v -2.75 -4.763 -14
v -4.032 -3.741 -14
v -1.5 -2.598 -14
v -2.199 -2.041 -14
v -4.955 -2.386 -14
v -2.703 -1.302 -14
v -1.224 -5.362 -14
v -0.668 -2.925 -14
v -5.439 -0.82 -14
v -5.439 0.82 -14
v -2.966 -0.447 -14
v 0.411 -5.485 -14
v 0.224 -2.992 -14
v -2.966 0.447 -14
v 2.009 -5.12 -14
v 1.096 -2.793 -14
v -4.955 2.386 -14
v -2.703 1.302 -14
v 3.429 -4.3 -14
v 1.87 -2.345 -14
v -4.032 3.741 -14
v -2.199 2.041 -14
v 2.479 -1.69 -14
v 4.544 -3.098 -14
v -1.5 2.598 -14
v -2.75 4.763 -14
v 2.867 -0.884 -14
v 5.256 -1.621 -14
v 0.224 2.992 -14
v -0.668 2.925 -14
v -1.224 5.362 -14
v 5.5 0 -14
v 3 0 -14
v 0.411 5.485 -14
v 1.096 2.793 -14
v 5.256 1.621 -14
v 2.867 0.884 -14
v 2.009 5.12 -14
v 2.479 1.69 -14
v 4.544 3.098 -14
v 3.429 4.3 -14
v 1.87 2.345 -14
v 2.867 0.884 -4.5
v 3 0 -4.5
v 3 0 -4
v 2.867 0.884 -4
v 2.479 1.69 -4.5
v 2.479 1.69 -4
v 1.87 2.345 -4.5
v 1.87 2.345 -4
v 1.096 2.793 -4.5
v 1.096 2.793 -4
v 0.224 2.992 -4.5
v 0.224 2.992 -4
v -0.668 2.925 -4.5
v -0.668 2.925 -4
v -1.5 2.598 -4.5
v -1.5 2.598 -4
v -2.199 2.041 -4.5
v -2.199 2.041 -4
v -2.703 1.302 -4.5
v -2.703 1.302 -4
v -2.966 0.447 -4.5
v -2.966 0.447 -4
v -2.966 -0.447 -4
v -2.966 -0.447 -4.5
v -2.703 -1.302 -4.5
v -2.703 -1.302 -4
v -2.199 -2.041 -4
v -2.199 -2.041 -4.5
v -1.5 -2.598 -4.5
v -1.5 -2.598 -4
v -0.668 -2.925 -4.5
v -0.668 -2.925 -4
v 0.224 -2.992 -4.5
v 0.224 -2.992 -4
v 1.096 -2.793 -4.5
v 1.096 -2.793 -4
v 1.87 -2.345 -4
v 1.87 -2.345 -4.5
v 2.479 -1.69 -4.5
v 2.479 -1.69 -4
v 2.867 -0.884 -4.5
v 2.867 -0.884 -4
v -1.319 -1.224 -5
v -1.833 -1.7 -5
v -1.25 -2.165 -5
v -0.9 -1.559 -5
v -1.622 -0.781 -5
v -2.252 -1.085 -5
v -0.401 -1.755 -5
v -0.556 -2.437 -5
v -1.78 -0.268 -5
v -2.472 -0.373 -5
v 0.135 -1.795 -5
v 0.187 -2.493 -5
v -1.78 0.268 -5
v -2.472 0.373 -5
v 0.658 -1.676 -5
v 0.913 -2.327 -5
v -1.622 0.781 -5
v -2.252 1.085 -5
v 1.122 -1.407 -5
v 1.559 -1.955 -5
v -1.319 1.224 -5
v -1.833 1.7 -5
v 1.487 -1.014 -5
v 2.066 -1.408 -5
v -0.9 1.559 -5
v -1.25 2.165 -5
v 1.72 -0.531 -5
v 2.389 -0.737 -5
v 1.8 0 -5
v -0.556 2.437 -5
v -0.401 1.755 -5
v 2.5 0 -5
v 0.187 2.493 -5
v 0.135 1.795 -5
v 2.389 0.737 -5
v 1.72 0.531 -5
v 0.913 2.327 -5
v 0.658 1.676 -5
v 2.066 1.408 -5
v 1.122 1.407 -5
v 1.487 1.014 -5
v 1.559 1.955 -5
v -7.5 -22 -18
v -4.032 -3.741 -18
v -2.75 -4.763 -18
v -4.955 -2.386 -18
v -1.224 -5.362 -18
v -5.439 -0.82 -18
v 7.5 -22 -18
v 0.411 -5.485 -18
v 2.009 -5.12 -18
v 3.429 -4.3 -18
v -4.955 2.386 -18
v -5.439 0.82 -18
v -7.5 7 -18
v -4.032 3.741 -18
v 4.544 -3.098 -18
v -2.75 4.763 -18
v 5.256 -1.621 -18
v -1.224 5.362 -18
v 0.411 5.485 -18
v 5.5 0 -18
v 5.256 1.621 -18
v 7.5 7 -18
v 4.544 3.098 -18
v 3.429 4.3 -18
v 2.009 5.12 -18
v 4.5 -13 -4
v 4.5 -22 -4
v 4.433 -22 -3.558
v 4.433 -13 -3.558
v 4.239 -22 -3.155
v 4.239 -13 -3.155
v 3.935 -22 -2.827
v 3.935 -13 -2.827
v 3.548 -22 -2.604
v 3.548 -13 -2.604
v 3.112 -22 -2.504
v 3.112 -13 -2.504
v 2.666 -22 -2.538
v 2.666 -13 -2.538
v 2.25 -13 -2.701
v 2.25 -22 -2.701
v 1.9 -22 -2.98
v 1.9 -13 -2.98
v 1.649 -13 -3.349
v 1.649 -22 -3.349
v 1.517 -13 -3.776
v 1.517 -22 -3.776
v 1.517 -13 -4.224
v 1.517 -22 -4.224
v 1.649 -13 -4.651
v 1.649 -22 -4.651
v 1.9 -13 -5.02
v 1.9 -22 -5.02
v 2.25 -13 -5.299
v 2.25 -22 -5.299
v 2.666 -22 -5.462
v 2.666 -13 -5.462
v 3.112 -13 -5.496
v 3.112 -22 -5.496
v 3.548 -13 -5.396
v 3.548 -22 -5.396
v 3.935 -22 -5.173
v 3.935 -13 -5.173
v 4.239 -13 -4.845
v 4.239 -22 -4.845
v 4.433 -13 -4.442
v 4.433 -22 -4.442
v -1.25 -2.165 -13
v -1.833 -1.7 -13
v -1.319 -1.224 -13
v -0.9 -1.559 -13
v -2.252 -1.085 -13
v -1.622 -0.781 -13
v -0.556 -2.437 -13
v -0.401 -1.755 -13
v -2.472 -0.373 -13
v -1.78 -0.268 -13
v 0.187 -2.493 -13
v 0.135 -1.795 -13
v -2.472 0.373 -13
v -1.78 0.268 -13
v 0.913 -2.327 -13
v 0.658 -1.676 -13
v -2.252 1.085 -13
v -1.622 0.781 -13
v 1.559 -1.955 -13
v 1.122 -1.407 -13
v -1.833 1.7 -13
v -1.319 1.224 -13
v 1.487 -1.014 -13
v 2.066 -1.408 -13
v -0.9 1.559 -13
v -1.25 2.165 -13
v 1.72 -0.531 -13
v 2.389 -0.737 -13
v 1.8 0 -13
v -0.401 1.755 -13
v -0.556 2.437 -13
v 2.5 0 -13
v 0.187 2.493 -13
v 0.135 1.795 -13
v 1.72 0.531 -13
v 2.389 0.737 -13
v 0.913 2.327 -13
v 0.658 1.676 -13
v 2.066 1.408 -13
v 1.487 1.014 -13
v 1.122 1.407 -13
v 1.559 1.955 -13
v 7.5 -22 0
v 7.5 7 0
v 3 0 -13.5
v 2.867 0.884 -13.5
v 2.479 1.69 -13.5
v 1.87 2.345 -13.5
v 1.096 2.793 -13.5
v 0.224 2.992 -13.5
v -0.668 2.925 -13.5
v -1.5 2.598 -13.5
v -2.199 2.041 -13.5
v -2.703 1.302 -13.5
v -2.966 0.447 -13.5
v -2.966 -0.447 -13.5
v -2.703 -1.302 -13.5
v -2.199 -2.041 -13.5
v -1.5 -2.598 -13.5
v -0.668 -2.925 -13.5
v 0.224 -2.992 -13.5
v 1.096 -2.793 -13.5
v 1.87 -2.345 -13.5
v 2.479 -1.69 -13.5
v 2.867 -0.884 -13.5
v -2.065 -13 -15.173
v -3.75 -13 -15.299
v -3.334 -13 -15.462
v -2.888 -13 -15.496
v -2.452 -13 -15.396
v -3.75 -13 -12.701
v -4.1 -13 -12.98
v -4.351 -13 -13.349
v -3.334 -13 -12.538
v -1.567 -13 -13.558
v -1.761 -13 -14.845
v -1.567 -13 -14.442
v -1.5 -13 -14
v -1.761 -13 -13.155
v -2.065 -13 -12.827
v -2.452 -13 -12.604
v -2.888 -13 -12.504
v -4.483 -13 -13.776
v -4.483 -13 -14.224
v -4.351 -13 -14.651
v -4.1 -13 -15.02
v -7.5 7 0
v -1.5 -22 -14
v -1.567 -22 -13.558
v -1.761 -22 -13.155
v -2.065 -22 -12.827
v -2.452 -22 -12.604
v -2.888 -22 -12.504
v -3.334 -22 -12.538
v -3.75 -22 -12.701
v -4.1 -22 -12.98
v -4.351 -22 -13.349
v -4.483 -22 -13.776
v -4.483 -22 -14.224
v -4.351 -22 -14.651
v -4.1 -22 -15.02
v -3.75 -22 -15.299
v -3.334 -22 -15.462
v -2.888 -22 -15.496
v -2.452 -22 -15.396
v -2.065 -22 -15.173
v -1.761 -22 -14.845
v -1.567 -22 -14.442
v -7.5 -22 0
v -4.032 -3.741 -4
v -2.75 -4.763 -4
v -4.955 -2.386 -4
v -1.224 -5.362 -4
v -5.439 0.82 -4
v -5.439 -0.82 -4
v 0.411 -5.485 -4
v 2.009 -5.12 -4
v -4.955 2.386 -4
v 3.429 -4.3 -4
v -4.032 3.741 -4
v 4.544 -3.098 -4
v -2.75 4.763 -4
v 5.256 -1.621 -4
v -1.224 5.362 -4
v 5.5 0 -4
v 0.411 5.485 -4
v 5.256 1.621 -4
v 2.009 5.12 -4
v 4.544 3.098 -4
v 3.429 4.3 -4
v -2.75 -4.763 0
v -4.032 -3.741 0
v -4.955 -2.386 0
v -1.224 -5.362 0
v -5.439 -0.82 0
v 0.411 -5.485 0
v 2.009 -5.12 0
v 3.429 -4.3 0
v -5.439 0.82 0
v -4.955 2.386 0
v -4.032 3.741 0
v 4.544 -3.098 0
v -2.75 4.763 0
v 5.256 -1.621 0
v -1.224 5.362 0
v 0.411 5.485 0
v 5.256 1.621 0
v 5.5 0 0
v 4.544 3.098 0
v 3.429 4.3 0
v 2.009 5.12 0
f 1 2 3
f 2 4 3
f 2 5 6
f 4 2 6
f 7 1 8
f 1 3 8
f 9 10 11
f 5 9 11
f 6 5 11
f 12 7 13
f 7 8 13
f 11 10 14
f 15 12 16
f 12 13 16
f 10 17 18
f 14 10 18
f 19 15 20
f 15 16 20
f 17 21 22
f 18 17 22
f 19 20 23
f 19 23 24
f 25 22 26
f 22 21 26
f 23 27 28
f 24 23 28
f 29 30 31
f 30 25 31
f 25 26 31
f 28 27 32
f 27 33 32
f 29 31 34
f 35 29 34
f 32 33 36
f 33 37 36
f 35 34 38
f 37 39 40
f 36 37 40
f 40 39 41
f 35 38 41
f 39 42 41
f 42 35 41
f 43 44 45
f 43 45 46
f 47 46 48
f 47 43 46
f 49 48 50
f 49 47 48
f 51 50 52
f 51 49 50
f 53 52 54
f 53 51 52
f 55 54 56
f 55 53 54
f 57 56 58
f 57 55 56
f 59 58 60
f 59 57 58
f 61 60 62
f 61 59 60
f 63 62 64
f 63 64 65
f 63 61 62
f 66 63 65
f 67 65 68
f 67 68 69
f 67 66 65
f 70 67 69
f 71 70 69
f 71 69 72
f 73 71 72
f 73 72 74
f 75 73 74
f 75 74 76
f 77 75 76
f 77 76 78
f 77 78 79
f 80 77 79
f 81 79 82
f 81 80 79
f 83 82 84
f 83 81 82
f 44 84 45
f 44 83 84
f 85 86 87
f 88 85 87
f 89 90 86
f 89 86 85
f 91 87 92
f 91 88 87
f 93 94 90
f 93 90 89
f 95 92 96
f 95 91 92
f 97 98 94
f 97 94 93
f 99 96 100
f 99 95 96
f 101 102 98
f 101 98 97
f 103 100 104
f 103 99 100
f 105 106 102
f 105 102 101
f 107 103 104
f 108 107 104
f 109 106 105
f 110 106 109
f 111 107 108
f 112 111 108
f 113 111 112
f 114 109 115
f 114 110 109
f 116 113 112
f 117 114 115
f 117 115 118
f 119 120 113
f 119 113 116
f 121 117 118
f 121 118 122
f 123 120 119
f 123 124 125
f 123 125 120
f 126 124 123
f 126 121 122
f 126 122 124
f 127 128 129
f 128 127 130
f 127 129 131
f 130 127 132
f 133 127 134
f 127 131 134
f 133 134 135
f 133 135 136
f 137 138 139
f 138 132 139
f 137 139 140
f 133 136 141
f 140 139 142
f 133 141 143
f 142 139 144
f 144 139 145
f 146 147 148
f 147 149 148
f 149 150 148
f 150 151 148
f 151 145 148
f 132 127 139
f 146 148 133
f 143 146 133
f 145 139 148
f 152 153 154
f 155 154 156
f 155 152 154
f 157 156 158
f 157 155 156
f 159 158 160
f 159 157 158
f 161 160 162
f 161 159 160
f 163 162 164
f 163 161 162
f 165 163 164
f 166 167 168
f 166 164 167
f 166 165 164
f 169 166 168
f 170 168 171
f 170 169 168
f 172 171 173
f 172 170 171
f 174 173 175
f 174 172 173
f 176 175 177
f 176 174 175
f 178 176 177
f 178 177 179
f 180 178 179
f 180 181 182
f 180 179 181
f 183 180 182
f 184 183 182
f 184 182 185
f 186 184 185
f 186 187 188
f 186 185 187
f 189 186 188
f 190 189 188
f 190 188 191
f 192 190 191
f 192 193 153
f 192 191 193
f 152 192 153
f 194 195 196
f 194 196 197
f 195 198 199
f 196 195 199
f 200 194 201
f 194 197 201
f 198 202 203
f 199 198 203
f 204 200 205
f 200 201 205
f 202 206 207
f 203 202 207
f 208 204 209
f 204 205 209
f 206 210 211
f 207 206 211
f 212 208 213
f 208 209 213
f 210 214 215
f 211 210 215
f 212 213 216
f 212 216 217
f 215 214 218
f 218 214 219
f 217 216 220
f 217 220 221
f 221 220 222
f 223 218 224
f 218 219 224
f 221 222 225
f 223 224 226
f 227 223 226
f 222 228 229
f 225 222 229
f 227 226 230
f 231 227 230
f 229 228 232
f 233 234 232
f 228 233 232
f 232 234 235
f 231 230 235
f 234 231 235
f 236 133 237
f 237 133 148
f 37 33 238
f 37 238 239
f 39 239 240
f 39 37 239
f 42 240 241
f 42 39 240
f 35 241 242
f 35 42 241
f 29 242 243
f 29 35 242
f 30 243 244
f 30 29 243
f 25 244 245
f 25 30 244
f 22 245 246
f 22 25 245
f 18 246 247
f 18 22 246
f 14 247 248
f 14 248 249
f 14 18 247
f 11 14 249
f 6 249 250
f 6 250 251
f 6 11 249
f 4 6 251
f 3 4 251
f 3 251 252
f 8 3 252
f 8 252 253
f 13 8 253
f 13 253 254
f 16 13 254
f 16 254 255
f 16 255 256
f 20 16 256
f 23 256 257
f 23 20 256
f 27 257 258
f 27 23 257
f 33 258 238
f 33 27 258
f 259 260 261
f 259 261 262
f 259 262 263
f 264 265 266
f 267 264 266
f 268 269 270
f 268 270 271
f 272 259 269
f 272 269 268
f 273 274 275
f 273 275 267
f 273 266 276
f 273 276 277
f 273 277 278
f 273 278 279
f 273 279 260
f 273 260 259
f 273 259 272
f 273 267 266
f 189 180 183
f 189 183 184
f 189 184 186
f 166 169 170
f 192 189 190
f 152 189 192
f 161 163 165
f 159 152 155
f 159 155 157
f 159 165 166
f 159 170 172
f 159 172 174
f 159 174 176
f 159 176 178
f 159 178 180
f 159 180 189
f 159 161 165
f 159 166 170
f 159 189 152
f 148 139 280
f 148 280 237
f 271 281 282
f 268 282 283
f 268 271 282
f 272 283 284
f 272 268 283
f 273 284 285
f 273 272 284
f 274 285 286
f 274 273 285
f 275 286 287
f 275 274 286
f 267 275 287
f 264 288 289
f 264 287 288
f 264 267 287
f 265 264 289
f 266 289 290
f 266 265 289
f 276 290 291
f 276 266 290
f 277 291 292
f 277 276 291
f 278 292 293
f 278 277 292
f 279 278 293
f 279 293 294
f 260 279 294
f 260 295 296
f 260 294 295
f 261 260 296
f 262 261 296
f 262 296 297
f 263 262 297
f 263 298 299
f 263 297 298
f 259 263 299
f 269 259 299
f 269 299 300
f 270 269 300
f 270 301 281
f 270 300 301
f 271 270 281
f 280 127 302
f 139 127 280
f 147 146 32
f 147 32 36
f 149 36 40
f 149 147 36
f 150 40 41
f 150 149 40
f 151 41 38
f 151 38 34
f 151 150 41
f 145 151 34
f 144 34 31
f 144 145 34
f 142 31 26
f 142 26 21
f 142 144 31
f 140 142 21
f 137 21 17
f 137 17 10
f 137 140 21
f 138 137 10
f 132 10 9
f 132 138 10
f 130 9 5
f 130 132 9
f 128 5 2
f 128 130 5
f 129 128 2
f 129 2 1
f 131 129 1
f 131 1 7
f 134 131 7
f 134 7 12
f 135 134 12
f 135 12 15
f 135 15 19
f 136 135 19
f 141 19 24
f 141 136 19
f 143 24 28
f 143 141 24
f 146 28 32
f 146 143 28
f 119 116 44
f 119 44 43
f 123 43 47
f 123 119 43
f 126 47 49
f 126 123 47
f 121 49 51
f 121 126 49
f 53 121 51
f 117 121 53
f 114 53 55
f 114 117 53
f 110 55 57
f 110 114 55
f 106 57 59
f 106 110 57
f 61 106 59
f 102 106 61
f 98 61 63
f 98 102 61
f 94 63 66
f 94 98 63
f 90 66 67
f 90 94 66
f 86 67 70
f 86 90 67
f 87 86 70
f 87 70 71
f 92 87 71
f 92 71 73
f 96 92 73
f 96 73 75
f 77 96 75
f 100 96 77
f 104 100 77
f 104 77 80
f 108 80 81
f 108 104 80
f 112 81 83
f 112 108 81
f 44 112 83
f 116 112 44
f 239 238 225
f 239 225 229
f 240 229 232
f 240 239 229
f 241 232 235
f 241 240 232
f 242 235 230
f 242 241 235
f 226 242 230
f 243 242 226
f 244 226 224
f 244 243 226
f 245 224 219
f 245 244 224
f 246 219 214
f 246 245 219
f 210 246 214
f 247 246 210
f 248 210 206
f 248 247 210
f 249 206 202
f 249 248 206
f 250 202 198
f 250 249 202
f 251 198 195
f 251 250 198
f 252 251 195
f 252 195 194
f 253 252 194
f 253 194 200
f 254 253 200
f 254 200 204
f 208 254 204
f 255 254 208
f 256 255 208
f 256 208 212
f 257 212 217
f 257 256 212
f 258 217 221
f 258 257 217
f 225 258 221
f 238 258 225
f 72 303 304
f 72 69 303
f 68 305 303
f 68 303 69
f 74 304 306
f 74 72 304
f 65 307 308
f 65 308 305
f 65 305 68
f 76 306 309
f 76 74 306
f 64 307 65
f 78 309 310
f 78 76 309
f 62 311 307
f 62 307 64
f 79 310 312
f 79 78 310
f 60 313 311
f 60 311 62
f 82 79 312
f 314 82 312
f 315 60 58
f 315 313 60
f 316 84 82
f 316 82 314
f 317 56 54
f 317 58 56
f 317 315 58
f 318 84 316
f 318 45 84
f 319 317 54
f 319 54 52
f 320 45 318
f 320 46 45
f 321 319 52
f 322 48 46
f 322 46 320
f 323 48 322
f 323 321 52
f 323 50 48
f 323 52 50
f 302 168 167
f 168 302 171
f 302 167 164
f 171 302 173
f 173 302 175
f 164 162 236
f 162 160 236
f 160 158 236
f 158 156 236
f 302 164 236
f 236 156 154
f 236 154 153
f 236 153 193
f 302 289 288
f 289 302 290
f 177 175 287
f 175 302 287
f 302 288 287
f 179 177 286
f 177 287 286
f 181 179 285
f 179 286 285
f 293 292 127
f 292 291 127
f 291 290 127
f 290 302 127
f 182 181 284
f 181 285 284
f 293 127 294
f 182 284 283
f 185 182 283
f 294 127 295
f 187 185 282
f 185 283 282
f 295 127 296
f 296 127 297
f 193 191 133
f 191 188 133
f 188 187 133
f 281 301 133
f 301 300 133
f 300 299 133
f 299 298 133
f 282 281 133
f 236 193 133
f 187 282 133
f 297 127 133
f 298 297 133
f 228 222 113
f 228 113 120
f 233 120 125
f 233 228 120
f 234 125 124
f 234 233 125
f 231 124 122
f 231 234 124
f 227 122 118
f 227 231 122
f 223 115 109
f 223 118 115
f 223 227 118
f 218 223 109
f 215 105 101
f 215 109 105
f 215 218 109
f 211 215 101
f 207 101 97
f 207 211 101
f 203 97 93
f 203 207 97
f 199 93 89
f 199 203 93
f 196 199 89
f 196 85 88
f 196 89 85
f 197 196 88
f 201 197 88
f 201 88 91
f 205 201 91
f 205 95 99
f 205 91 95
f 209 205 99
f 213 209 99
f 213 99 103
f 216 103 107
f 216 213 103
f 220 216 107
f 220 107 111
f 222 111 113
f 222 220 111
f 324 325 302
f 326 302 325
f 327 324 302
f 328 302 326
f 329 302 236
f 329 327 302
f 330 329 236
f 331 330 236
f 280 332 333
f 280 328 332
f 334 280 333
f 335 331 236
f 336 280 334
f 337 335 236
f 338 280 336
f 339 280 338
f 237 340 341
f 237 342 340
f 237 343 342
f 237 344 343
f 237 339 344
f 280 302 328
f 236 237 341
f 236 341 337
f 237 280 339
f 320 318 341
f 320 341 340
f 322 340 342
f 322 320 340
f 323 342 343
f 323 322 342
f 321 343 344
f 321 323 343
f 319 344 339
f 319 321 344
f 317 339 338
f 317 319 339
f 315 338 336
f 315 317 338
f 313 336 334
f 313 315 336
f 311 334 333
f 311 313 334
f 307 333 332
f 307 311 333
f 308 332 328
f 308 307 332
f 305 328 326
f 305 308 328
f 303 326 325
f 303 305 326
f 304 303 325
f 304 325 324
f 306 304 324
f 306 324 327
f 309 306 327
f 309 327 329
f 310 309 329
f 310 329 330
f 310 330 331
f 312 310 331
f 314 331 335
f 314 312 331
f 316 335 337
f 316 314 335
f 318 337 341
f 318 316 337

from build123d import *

# Parameters (mm, degrees)
CYLINDER095_R      = 1.5
CYLINDER095_DEPTH  = 21
CYLINDER094_R      = 1.5
CYLINDER094_DEPTH  = 21
CYLINDER085_R      = 1.8
CYLINDER085_DEPTH  = 12
CYLINDER088_R      = 3
CYLINDER088_DEPTH  = 1
CYLINDER089_R      = 3
CYLINDER089_DEPTH  = 1
CYLINDER087_R      = 5.5
CYLINDER087_DEPTH  = 4
CYLINDER086_R      = 5.5
CYLINDER086_DEPTH  = 4
BOX406008013_W     = 15
BOX406008013_H     = 29
BOX406008013_DEPTH = 18
CHAMFER_SIZE       = 0.5
CHAMFER001_SIZE    = 0.5


with BuildPart() as cylinder095:
    # Cylinder095 → Cylinder095 (new body)
    with BuildSketch(Plane(origin=(3, -13, -4), x_dir=(1, 0, 0), z_dir=(0, -1, 0))):
        Circle(CYLINDER095_R)
    extrude(amount=CYLINDER095_DEPTH)


with BuildPart() as fusion103077013004017014:
    # Cylinder094 → Cylinder094 (new body)
    with BuildSketch(Plane(origin=(-3, -13, -14), x_dir=(1, 0, 0), z_dir=(0, -1, 0))):
        Circle(CYLINDER094_R)
    extrude(amount=CYLINDER094_DEPTH)

    # Fusion103077013004017014: union Cylinder095
    add(cylinder095.part)


with BuildPart() as cylinder081:
    # Cylinder085 → Cylinder085 (new body)
    with BuildSketch(Plane.XY.offset(-14)):
        Circle(CYLINDER085_R)
    extrude(amount=CYLINDER085_DEPTH)


with BuildPart() as cylinder082:
    # Cylinder088 → Cylinder088 (new body)
    with BuildSketch(Plane.XY.offset(-5)):
        Circle(CYLINDER088_R)
    extrude(amount=CYLINDER088_DEPTH)


with BuildPart() as fusion103077013004017009:
    # Cylinder089 → Cylinder089 (new body)
    with BuildSketch(Plane.XY.offset(-14)):
        Circle(CYLINDER089_R)
    extrude(amount=CYLINDER089_DEPTH)

    # Fusion103077013004017009: union Cylinder082
    add(cylinder082.part)


with BuildPart() as f_623_bearing003:
    # Cylinder087 → Cylinder087 (new body)
    with BuildSketch(Plane.XY.offset(-18)):
        Circle(CYLINDER087_R)
    extrude(amount=CYLINDER087_DEPTH)


with BuildPart() as f_623_bearing_holes:
    # Cylinder086 → Cylinder086 (new body)
    with BuildSketch(Plane.XY.offset(-4)):
        Circle(CYLINDER086_R)
    extrude(amount=CYLINDER086_DEPTH)

    # Fusion103077013004017008: union 623 Bearing003
    add(f_623_bearing003.part)


with BuildPart() as cut078:
    # Box406008013 → Box406008013 (new body)
    with BuildSketch(Plane(origin=(-7.5, -22, -18), x_dir=(1, 0, 0), z_dir=(0, 0, 1))):
        with Locations((7.5, 14.5)):
            Rectangle(BOX406008013_W, BOX406008013_H)
    extrude(amount=BOX406008013_DEPTH)

    # Cut070: cut 623 Bearing Holes
    add(f_623_bearing_holes.part, mode=Mode.SUBTRACT)

    # Cut071: cut Fusion103077013004017009
    add(fusion103077013004017009.part, mode=Mode.SUBTRACT)

    # Cut072: cut Cylinder081
    add(cylinder081.part, mode=Mode.SUBTRACT)

    # Chamfer
    chamfer_edges = [cut078.edges().sort_by_distance(p)[0] for p in [
        (-3, 0, -5),
    ]]
    chamfer(chamfer_edges, length=CHAMFER_SIZE)

    # Chamfer001
    chamfer001_edges = [cut078.edges().sort_by_distance(p)[0] for p in [
        (-3, 0, -13),
    ]]
    chamfer(chamfer001_edges, length=CHAMFER001_SIZE)

    # Cut078: cut Fusion103077013004017014
    add(fusion103077013004017014.part, mode=Mode.SUBTRACT)


solid = cut078.part
